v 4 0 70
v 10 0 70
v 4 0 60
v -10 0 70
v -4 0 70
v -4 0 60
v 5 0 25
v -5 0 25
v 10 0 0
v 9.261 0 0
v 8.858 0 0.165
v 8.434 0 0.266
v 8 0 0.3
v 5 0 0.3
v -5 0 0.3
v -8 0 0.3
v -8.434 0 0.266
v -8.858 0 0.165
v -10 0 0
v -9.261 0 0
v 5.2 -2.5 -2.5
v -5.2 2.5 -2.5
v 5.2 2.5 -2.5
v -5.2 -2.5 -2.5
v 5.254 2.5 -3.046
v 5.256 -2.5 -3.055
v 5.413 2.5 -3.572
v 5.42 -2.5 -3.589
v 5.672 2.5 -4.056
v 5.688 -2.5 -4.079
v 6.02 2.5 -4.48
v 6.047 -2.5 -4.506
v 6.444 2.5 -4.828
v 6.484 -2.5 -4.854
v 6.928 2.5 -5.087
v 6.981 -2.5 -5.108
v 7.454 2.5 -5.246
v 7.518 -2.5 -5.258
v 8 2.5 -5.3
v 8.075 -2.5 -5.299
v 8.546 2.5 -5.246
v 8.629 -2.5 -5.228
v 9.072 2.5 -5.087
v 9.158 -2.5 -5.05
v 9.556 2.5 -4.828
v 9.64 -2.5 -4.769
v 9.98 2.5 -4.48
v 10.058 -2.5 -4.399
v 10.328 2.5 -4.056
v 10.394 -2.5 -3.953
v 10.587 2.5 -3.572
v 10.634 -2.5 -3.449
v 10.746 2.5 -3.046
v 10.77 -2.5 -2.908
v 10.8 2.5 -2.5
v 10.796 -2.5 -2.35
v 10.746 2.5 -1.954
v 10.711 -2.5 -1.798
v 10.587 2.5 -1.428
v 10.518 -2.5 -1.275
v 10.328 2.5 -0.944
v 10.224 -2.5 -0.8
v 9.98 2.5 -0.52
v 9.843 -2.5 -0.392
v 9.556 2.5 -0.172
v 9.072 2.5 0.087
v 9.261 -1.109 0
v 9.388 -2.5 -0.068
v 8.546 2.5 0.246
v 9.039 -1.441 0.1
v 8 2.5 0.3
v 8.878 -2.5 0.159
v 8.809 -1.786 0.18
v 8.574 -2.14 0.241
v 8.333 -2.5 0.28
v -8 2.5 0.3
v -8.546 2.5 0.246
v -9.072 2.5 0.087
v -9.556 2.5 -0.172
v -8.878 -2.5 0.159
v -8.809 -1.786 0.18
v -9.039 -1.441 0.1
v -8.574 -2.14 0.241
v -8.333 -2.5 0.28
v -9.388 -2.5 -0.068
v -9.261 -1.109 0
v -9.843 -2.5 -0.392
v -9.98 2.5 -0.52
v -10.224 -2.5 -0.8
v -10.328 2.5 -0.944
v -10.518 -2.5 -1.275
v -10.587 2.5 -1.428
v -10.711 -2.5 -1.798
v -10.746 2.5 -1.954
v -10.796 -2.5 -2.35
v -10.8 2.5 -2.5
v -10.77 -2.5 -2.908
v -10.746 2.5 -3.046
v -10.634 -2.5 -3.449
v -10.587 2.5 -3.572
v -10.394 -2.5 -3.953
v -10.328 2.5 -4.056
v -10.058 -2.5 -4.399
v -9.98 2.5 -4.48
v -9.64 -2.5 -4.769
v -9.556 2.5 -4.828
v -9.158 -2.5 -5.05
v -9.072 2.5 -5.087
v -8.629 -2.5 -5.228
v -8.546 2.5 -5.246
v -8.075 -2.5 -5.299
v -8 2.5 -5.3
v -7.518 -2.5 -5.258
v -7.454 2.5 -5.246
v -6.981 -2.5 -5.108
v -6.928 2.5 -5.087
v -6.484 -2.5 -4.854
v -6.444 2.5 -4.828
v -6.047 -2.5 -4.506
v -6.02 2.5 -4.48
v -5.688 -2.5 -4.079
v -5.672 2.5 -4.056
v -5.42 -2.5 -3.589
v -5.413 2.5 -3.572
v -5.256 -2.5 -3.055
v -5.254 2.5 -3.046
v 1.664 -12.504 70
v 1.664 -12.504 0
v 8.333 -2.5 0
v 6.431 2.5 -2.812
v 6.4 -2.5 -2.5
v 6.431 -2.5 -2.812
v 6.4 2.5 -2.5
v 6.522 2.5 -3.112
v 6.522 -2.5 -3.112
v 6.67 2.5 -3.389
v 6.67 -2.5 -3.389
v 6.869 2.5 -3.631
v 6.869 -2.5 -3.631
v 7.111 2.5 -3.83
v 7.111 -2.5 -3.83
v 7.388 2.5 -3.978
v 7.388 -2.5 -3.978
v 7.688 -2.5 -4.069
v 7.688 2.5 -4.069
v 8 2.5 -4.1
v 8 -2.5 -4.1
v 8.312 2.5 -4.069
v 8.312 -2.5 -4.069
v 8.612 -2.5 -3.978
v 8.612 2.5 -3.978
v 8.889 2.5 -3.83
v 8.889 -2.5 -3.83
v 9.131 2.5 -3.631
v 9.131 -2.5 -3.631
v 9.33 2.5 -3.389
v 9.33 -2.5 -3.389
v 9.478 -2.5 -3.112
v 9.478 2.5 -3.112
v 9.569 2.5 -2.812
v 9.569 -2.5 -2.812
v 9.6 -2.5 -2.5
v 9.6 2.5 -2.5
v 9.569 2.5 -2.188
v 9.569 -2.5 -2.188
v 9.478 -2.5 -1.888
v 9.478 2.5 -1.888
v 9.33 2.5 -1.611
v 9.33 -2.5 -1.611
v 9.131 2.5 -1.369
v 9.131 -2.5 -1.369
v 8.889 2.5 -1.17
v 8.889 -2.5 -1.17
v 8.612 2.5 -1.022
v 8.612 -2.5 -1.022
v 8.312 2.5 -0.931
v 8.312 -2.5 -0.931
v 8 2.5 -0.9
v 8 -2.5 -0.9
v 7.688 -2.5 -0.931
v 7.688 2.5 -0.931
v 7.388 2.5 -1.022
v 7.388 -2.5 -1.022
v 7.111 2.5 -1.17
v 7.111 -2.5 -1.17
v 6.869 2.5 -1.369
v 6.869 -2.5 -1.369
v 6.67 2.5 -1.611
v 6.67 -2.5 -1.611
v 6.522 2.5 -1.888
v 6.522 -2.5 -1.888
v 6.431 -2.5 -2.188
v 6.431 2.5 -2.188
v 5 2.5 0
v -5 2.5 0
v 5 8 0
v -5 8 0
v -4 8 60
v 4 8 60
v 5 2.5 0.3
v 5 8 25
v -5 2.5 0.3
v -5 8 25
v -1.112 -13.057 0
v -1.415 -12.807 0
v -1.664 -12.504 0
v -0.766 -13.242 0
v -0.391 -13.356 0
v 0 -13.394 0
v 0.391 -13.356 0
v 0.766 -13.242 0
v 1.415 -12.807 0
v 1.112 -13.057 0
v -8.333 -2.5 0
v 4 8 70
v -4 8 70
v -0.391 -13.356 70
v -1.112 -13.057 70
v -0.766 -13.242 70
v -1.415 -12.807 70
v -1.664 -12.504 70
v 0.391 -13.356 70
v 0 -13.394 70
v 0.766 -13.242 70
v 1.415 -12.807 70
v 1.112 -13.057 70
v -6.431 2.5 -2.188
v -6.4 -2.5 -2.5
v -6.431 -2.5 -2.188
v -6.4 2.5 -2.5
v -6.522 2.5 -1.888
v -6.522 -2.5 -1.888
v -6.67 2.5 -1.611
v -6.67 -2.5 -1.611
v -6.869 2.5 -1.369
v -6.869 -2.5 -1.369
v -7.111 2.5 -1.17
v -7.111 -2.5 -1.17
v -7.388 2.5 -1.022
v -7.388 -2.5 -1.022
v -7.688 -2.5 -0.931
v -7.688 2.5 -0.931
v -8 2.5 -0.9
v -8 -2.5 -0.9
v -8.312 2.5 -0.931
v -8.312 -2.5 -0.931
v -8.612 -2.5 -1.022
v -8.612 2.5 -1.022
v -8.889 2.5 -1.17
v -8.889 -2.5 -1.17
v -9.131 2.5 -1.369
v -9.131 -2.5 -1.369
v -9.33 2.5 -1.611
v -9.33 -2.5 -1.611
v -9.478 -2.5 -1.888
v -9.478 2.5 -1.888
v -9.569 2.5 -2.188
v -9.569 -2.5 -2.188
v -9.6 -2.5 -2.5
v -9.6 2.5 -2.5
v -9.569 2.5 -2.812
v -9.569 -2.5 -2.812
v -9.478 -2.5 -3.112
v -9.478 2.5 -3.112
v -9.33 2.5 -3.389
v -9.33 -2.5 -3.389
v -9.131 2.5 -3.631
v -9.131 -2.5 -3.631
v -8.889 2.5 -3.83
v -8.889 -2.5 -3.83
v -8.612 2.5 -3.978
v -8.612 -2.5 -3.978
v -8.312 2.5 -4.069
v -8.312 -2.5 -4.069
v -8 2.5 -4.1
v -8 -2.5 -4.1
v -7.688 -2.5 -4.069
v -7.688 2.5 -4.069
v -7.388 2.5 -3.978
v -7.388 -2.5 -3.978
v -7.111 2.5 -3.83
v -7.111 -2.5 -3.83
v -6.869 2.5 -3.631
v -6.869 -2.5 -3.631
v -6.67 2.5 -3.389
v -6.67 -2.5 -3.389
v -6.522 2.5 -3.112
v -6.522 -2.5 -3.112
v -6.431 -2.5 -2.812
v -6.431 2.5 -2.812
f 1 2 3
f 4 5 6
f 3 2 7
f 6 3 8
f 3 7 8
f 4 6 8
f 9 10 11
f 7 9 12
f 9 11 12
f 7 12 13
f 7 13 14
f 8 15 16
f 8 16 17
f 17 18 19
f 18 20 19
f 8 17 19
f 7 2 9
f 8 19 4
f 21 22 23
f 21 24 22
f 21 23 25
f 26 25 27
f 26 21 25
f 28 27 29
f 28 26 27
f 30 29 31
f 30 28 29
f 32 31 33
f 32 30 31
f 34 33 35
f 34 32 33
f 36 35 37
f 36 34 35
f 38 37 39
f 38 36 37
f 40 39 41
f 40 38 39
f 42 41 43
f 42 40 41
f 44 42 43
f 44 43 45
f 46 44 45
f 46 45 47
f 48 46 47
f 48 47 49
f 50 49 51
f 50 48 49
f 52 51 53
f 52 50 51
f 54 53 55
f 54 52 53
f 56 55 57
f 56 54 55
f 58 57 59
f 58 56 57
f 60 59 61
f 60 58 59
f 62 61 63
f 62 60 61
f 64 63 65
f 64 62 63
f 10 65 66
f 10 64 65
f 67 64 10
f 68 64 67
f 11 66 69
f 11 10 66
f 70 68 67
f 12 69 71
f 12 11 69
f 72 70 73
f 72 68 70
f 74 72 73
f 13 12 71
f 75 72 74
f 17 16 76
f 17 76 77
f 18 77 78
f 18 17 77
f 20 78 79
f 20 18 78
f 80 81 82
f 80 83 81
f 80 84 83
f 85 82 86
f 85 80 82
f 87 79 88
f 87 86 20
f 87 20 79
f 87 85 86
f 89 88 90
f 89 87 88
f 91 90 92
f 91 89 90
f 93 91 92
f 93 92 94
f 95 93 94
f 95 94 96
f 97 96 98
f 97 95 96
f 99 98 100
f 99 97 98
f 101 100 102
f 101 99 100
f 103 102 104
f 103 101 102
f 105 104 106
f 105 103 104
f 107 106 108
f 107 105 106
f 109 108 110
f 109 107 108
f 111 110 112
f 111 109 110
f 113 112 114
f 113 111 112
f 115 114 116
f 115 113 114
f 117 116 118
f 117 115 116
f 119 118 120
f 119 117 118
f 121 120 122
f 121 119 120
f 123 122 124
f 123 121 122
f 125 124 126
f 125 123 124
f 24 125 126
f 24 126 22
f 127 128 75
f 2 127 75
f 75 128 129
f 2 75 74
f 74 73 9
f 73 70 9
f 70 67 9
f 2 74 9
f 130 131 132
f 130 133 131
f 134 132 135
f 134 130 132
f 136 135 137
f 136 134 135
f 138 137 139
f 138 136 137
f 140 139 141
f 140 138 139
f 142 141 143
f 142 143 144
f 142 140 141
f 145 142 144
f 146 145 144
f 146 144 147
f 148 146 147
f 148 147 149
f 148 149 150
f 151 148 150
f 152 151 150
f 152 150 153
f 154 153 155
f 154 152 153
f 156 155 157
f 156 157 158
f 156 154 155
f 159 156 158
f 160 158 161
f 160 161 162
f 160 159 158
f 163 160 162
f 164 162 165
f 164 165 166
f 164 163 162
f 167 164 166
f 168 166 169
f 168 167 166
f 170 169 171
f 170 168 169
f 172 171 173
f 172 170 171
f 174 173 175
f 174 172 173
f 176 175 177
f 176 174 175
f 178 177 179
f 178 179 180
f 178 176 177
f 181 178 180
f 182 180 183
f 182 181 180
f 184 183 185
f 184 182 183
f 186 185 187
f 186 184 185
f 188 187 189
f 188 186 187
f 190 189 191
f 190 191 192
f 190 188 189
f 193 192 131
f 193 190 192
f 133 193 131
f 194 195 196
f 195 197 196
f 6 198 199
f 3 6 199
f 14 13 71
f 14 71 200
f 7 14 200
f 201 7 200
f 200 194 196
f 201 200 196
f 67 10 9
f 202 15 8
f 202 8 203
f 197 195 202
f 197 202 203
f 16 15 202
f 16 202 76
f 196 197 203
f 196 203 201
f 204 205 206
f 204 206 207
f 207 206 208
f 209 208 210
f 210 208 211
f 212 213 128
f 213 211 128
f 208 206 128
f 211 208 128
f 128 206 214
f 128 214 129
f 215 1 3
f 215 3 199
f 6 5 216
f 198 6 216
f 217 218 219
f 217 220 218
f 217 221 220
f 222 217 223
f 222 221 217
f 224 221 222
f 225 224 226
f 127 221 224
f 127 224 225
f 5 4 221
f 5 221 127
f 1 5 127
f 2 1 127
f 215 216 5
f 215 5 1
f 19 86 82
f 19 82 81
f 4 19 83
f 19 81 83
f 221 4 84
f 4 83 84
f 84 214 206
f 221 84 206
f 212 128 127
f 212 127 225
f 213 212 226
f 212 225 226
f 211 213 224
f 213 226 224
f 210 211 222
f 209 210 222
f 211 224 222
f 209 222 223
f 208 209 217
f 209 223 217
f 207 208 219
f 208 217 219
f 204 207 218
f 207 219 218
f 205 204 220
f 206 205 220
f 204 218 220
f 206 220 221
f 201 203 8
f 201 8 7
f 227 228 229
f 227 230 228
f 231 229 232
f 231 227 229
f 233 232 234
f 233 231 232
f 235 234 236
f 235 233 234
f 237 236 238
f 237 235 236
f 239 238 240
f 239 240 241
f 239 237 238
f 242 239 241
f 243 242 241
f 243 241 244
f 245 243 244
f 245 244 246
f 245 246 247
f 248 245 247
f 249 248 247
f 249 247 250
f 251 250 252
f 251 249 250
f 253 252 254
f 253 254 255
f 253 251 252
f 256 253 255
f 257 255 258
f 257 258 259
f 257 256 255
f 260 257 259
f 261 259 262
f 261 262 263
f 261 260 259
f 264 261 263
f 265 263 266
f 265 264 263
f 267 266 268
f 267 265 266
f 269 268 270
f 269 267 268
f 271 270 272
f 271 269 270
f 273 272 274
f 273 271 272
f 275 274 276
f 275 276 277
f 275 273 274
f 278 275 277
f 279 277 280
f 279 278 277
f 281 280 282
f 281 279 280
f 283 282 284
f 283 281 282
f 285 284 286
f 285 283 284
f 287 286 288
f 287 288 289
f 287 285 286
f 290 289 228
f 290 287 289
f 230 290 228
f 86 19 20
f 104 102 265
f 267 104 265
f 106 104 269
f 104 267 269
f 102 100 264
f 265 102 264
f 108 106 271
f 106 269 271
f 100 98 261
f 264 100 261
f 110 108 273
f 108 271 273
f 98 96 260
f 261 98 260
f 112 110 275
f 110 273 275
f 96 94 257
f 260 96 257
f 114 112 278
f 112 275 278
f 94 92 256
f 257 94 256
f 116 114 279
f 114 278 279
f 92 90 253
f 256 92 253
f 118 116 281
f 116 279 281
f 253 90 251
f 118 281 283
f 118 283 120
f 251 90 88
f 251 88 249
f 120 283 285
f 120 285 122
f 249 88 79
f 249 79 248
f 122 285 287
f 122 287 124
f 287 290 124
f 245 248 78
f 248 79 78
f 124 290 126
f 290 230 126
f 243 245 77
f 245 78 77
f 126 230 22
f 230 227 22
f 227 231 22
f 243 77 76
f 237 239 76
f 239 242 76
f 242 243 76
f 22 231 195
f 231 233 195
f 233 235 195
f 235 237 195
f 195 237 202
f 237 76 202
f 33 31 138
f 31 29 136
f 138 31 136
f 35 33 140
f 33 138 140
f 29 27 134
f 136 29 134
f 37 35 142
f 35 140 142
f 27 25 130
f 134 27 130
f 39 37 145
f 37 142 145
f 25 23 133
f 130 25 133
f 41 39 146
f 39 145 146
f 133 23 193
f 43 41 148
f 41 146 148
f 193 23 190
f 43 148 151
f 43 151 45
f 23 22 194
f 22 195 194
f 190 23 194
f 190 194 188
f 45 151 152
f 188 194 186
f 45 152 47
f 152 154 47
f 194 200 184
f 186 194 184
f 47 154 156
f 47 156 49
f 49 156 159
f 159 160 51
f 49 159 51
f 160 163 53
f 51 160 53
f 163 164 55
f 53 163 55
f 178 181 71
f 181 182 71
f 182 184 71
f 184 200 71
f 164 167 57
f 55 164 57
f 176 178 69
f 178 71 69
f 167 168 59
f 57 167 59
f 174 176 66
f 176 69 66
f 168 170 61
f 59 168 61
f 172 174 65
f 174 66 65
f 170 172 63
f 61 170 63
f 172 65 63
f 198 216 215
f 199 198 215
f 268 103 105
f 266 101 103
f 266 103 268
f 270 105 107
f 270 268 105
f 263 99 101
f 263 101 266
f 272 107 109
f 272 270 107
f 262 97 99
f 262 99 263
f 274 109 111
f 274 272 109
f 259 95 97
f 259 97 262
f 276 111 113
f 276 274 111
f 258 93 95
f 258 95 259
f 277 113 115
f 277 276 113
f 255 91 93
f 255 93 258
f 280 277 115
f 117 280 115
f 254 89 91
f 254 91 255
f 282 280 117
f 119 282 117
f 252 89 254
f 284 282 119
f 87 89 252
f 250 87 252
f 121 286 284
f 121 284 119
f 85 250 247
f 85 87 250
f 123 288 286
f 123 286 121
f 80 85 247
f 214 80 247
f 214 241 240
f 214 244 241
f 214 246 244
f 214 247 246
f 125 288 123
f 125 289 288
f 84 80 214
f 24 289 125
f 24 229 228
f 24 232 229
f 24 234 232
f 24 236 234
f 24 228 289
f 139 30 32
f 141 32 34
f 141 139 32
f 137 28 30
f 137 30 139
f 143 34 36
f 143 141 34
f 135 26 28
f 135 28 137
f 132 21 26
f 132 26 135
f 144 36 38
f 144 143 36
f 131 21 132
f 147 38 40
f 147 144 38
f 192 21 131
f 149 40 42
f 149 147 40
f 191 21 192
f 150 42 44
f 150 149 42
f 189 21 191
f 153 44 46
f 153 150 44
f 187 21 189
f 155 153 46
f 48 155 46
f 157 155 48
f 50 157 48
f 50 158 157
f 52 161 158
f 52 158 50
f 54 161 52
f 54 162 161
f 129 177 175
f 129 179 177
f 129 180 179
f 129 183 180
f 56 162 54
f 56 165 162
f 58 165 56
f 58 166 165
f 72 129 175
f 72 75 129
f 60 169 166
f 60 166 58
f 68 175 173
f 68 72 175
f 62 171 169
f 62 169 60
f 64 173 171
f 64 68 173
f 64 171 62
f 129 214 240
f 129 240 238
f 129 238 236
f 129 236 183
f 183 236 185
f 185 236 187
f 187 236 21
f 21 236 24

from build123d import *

# Parameters (mm, degrees)
EXTRUDE_1_DEPTH = 70
SKETCH_2_W      = 10
SKETCH_2_H      = 8
EXTRUDE_2_DEPTH = 25
SKETCH_3_W      = 8
SKETCH_3_H      = 8
EXTRUDE_3_DEPTH = 10
SKETCH_5_R      = 1.6
EXTRUDE_4_DEPTH = 2.5
FILLET_1_R      = 2


with BuildPart() as part:
    # 草图1 → 凸台-拉伸1 (new body)
    with BuildSketch(Plane.XY):
        Polygon((0, -15), (10, 0), (-10, 0), align=None)
    extrude(amount=EXTRUDE_1_DEPTH)

    # 草图2 → 凸台-拉伸2 (add)
    with BuildSketch(Plane.XY):
        with Locations((0, 4)):
            Rectangle(SKETCH_2_W, SKETCH_2_H)
    extrude(amount=EXTRUDE_2_DEPTH)

    # 草图3 → 凸台-拉伸3 (add)
    with BuildSketch(Plane.XY.offset(70)):
        with Locations((0, 4)):
            Rectangle(SKETCH_3_W, SKETCH_3_H)
    extrude(amount=-EXTRUDE_3_DEPTH)

    # 草图5 → 凸台-拉伸4 (add, symmetric)
    with BuildSketch(Plane.XZ):
        with BuildLine():
            Line((-5.2, -2.5), (5.2, -2.5))
            ThreePointArc((5.2, -2.5), (9.979898987, -4.479898987), (8, 0.3))
            Line((8, 0.3), (-8, 0.3))
            ThreePointArc((-8, 0.3), (-9.979898987, -4.479898987), (-5.2, -2.5))
        make_face()
        with Locations((-8, -2.5)):
            Circle(SKETCH_5_R, mode=Mode.SUBTRACT)
        with Locations(Location((8, -2.5, 0), (0, 0, 180))):
            Circle(SKETCH_5_R, mode=Mode.SUBTRACT)
    extrude(amount=EXTRUDE_4_DEPTH, both=True)

    # 圆角1
    fillet_1_edges = [part.edges().sort_by_distance(p)[0] for p in [
        (0, -15, 35),
    ]]
    fillet(fillet_1_edges, radius=FILLET_1_R)


solid = part.part
